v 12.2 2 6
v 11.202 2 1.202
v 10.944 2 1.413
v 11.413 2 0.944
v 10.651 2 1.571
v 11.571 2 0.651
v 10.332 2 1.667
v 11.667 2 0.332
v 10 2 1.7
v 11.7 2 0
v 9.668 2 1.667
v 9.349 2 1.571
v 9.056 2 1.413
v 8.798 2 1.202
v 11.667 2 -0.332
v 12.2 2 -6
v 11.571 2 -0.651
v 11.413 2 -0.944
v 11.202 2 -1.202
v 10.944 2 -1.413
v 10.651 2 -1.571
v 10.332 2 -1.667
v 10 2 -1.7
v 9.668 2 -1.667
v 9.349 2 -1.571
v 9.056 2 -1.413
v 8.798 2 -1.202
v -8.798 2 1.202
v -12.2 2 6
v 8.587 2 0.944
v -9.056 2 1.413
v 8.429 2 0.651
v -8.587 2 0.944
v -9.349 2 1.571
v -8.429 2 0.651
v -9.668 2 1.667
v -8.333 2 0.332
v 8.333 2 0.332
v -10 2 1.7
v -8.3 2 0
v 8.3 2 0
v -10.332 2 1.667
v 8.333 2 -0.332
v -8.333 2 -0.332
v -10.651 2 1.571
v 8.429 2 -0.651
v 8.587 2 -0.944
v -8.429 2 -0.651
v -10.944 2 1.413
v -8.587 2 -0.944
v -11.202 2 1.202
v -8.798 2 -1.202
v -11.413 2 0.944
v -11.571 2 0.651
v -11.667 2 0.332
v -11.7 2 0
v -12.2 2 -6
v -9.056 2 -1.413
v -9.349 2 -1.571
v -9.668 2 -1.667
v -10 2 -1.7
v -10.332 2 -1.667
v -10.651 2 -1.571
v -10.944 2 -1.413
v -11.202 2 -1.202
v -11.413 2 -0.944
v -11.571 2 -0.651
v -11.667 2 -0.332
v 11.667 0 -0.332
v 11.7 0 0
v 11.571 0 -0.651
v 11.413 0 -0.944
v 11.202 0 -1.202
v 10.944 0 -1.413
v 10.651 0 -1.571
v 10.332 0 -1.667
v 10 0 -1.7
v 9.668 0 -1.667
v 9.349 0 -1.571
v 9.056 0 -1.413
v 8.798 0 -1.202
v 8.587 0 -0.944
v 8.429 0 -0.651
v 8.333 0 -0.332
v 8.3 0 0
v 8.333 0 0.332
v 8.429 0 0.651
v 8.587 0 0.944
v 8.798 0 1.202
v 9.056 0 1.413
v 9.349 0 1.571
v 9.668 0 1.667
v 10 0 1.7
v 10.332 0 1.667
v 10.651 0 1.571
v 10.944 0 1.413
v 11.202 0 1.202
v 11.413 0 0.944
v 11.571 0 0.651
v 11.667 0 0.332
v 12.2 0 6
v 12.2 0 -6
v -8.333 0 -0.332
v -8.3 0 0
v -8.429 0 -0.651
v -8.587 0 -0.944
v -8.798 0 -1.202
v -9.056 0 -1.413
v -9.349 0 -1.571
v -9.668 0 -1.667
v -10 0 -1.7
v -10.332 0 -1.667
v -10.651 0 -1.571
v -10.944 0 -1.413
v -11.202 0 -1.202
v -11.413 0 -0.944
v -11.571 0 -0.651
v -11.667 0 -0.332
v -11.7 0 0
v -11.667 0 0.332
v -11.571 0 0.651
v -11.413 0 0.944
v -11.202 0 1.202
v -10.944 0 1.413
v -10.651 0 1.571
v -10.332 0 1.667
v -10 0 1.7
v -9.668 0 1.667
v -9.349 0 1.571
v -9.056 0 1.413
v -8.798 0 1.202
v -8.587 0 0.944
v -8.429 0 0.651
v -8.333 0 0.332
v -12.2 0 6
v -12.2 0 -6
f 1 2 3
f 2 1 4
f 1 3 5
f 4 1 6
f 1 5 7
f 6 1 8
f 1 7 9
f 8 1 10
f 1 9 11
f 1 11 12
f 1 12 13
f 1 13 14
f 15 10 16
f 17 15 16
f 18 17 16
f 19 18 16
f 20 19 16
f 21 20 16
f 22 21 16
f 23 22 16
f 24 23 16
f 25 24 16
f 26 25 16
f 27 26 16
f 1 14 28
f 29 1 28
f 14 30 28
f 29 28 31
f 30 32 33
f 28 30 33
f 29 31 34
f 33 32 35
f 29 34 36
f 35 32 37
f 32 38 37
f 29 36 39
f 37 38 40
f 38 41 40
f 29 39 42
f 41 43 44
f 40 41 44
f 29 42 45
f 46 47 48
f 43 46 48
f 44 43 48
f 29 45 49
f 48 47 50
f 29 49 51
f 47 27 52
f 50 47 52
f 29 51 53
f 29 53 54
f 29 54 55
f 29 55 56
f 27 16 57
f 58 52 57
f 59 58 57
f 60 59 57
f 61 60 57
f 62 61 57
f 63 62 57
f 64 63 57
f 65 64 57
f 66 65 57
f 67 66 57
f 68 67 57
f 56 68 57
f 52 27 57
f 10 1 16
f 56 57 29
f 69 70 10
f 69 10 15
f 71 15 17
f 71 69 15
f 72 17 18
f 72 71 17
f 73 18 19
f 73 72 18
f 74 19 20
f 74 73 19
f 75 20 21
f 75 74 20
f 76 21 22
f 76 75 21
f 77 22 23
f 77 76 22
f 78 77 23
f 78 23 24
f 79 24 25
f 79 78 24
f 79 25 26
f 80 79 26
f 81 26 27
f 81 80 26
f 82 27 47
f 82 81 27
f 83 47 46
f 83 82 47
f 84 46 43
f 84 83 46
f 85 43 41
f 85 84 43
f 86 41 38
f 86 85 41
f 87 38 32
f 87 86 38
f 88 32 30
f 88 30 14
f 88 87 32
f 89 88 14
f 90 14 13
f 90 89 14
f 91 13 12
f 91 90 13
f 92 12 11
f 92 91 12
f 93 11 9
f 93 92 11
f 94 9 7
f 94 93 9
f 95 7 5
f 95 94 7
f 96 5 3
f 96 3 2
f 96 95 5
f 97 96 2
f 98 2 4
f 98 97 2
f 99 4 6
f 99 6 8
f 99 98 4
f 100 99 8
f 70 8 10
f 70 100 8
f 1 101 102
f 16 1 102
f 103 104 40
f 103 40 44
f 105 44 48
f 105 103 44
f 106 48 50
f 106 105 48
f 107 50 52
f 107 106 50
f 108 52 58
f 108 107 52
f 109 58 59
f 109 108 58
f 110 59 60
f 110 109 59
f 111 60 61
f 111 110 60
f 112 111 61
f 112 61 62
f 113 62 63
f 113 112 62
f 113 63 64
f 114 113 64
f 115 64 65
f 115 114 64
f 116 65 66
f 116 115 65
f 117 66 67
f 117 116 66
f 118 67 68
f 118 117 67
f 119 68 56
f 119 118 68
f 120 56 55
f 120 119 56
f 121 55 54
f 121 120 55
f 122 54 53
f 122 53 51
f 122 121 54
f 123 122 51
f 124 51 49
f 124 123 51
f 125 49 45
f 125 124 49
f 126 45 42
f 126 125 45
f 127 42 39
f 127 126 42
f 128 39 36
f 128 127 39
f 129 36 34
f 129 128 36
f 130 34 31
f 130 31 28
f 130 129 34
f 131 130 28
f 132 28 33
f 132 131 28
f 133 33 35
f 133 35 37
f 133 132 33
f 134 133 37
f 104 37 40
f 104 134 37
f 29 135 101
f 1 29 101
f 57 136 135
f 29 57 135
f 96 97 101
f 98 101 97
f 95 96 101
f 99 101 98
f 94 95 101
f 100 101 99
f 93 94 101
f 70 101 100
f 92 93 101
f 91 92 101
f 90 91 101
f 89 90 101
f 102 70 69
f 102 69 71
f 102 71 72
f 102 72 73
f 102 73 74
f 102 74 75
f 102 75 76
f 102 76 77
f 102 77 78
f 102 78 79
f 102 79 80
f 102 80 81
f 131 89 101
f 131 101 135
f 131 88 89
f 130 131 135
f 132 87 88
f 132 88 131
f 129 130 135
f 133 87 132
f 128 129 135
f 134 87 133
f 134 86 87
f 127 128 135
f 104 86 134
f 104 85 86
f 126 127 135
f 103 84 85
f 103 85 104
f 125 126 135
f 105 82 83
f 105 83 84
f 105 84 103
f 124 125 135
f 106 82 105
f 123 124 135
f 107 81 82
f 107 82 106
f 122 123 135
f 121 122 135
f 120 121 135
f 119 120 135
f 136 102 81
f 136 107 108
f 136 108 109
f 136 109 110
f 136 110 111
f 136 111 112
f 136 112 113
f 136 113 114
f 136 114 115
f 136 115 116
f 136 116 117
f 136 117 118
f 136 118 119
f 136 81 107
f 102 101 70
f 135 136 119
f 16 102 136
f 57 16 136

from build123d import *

# Parameters (mm, degrees)
CROQUIS1_R              = 1.7
SALIENTE_EXTRUIR1_DEPTH = 2


with BuildPart() as part:
    # Croquis1 → Saliente-Extruir1 (new body)
    with BuildSketch(Plane(origin=(0, 0, 0), x_dir=(1, 0, 0), z_dir=(0, 1, 0))):
        Polygon((-8.046684223, -2.46171515), (-8.046684223, 2.46171515), (-8.046684223, 6), (8.046684223, 6), (8.046684223, 2.46171515), (8.046684223, -2.46171515), (8.046684223, -6), (-8.046684223, -6), align=None)
        with BuildLine():
            Line((8.046684223, -2.46171515), (8.046684223, 2.46171515))
            ThreePointArc((8.046684223, 2.46171515), (8.827888747, 2.181898598), (9.657649034, 2.173199442))
            ThreePointArc((9.657649034, 2.173199442), (12.2, 0), (9.657649034, -2.173199442))
            ThreePointArc((9.657649034, -2.173199442), (8.827888747, -2.181898598), (8.046684223, -2.46171515))
        make_face()
        with Locations((10, 0)):
            Circle(CROQUIS1_R, mode=Mode.SUBTRACT)
        with BuildLine():
            ThreePointArc((-9.657649034, -2.173199442), (-12.2, 0), (-9.657649034, 2.173199442))
            ThreePointArc((-9.657649034, 2.173199442), (-8.827888747, 2.181898598), (-8.046684223, 2.46171515))
            Line((-8.046684223, 2.46171515), (-8.046684223, -2.46171515))
            ThreePointArc((-8.046684223, -2.46171515), (-8.827888747, -2.181898598), (-9.657649034, -2.173199442))
        make_face()
        with Locations((-10, 0)):
            Circle(CROQUIS1_R, mode=Mode.SUBTRACT)
        with BuildLine():
            Line((-8.046684223, -6), (-8.046684223, -2.46171515))
            ThreePointArc((-8.046684223, -2.46171515), (-8.827888747, -2.181898598), (-9.657649034, -2.173199442))
            ThreePointArc((-9.657649034, -2.173199442), (-11.429480303, -1.672299633), (-12.2, 0))
            Line((-12.2, 0), (-12.2, -6))
            Line((-12.2, -6), (-8.046684223, -6))
        make_face()
        with BuildLine():
            Line((-8.046684223, 2.46171515), (-8.046684223, 6))
            Line((-8.046684223, 6), (-12.2, 6))
            Line((-12.2, 6), (-12.2, 0))
            ThreePointArc((-12.2, 0), (-11.429480303, 1.672299633), (-9.657649034, 2.173199442))
            ThreePointArc((-9.657649034, 2.173199442), (-8.827888747, 2.181898598), (-8.046684223, 2.46171515))
        make_face()
        with BuildLine():
            Line((12.2, 6), (8.046684223, 6))
            Line((8.046684223, 6), (8.046684223, 2.46171515))
            ThreePointArc((8.046684223, 2.46171515), (8.827888747, 2.181898598), (9.657649034, 2.173199442))
            ThreePointArc((9.657649034, 2.173199442), (11.429480303, 1.672299633), (12.2, 0))
            Line((12.2, 0), (12.2, 6))
        make_face()
        with BuildLine():
            ThreePointArc((9.657649034, -2.173199442), (8.827888747, -2.181898598), (8.046684223, -2.46171515))
            Line((8.046684223, -2.46171515), (8.046684223, -6))
            Line((8.046684223, -6), (12.2, -6))
            Line((12.2, -6), (12.2, 0))
            ThreePointArc((12.2, 0), (11.429480303, -1.672299633), (9.657649034, -2.173199442))
        make_face()
    extrude(amount=SALIENTE_EXTRUIR1_DEPTH)


solid = part.part
